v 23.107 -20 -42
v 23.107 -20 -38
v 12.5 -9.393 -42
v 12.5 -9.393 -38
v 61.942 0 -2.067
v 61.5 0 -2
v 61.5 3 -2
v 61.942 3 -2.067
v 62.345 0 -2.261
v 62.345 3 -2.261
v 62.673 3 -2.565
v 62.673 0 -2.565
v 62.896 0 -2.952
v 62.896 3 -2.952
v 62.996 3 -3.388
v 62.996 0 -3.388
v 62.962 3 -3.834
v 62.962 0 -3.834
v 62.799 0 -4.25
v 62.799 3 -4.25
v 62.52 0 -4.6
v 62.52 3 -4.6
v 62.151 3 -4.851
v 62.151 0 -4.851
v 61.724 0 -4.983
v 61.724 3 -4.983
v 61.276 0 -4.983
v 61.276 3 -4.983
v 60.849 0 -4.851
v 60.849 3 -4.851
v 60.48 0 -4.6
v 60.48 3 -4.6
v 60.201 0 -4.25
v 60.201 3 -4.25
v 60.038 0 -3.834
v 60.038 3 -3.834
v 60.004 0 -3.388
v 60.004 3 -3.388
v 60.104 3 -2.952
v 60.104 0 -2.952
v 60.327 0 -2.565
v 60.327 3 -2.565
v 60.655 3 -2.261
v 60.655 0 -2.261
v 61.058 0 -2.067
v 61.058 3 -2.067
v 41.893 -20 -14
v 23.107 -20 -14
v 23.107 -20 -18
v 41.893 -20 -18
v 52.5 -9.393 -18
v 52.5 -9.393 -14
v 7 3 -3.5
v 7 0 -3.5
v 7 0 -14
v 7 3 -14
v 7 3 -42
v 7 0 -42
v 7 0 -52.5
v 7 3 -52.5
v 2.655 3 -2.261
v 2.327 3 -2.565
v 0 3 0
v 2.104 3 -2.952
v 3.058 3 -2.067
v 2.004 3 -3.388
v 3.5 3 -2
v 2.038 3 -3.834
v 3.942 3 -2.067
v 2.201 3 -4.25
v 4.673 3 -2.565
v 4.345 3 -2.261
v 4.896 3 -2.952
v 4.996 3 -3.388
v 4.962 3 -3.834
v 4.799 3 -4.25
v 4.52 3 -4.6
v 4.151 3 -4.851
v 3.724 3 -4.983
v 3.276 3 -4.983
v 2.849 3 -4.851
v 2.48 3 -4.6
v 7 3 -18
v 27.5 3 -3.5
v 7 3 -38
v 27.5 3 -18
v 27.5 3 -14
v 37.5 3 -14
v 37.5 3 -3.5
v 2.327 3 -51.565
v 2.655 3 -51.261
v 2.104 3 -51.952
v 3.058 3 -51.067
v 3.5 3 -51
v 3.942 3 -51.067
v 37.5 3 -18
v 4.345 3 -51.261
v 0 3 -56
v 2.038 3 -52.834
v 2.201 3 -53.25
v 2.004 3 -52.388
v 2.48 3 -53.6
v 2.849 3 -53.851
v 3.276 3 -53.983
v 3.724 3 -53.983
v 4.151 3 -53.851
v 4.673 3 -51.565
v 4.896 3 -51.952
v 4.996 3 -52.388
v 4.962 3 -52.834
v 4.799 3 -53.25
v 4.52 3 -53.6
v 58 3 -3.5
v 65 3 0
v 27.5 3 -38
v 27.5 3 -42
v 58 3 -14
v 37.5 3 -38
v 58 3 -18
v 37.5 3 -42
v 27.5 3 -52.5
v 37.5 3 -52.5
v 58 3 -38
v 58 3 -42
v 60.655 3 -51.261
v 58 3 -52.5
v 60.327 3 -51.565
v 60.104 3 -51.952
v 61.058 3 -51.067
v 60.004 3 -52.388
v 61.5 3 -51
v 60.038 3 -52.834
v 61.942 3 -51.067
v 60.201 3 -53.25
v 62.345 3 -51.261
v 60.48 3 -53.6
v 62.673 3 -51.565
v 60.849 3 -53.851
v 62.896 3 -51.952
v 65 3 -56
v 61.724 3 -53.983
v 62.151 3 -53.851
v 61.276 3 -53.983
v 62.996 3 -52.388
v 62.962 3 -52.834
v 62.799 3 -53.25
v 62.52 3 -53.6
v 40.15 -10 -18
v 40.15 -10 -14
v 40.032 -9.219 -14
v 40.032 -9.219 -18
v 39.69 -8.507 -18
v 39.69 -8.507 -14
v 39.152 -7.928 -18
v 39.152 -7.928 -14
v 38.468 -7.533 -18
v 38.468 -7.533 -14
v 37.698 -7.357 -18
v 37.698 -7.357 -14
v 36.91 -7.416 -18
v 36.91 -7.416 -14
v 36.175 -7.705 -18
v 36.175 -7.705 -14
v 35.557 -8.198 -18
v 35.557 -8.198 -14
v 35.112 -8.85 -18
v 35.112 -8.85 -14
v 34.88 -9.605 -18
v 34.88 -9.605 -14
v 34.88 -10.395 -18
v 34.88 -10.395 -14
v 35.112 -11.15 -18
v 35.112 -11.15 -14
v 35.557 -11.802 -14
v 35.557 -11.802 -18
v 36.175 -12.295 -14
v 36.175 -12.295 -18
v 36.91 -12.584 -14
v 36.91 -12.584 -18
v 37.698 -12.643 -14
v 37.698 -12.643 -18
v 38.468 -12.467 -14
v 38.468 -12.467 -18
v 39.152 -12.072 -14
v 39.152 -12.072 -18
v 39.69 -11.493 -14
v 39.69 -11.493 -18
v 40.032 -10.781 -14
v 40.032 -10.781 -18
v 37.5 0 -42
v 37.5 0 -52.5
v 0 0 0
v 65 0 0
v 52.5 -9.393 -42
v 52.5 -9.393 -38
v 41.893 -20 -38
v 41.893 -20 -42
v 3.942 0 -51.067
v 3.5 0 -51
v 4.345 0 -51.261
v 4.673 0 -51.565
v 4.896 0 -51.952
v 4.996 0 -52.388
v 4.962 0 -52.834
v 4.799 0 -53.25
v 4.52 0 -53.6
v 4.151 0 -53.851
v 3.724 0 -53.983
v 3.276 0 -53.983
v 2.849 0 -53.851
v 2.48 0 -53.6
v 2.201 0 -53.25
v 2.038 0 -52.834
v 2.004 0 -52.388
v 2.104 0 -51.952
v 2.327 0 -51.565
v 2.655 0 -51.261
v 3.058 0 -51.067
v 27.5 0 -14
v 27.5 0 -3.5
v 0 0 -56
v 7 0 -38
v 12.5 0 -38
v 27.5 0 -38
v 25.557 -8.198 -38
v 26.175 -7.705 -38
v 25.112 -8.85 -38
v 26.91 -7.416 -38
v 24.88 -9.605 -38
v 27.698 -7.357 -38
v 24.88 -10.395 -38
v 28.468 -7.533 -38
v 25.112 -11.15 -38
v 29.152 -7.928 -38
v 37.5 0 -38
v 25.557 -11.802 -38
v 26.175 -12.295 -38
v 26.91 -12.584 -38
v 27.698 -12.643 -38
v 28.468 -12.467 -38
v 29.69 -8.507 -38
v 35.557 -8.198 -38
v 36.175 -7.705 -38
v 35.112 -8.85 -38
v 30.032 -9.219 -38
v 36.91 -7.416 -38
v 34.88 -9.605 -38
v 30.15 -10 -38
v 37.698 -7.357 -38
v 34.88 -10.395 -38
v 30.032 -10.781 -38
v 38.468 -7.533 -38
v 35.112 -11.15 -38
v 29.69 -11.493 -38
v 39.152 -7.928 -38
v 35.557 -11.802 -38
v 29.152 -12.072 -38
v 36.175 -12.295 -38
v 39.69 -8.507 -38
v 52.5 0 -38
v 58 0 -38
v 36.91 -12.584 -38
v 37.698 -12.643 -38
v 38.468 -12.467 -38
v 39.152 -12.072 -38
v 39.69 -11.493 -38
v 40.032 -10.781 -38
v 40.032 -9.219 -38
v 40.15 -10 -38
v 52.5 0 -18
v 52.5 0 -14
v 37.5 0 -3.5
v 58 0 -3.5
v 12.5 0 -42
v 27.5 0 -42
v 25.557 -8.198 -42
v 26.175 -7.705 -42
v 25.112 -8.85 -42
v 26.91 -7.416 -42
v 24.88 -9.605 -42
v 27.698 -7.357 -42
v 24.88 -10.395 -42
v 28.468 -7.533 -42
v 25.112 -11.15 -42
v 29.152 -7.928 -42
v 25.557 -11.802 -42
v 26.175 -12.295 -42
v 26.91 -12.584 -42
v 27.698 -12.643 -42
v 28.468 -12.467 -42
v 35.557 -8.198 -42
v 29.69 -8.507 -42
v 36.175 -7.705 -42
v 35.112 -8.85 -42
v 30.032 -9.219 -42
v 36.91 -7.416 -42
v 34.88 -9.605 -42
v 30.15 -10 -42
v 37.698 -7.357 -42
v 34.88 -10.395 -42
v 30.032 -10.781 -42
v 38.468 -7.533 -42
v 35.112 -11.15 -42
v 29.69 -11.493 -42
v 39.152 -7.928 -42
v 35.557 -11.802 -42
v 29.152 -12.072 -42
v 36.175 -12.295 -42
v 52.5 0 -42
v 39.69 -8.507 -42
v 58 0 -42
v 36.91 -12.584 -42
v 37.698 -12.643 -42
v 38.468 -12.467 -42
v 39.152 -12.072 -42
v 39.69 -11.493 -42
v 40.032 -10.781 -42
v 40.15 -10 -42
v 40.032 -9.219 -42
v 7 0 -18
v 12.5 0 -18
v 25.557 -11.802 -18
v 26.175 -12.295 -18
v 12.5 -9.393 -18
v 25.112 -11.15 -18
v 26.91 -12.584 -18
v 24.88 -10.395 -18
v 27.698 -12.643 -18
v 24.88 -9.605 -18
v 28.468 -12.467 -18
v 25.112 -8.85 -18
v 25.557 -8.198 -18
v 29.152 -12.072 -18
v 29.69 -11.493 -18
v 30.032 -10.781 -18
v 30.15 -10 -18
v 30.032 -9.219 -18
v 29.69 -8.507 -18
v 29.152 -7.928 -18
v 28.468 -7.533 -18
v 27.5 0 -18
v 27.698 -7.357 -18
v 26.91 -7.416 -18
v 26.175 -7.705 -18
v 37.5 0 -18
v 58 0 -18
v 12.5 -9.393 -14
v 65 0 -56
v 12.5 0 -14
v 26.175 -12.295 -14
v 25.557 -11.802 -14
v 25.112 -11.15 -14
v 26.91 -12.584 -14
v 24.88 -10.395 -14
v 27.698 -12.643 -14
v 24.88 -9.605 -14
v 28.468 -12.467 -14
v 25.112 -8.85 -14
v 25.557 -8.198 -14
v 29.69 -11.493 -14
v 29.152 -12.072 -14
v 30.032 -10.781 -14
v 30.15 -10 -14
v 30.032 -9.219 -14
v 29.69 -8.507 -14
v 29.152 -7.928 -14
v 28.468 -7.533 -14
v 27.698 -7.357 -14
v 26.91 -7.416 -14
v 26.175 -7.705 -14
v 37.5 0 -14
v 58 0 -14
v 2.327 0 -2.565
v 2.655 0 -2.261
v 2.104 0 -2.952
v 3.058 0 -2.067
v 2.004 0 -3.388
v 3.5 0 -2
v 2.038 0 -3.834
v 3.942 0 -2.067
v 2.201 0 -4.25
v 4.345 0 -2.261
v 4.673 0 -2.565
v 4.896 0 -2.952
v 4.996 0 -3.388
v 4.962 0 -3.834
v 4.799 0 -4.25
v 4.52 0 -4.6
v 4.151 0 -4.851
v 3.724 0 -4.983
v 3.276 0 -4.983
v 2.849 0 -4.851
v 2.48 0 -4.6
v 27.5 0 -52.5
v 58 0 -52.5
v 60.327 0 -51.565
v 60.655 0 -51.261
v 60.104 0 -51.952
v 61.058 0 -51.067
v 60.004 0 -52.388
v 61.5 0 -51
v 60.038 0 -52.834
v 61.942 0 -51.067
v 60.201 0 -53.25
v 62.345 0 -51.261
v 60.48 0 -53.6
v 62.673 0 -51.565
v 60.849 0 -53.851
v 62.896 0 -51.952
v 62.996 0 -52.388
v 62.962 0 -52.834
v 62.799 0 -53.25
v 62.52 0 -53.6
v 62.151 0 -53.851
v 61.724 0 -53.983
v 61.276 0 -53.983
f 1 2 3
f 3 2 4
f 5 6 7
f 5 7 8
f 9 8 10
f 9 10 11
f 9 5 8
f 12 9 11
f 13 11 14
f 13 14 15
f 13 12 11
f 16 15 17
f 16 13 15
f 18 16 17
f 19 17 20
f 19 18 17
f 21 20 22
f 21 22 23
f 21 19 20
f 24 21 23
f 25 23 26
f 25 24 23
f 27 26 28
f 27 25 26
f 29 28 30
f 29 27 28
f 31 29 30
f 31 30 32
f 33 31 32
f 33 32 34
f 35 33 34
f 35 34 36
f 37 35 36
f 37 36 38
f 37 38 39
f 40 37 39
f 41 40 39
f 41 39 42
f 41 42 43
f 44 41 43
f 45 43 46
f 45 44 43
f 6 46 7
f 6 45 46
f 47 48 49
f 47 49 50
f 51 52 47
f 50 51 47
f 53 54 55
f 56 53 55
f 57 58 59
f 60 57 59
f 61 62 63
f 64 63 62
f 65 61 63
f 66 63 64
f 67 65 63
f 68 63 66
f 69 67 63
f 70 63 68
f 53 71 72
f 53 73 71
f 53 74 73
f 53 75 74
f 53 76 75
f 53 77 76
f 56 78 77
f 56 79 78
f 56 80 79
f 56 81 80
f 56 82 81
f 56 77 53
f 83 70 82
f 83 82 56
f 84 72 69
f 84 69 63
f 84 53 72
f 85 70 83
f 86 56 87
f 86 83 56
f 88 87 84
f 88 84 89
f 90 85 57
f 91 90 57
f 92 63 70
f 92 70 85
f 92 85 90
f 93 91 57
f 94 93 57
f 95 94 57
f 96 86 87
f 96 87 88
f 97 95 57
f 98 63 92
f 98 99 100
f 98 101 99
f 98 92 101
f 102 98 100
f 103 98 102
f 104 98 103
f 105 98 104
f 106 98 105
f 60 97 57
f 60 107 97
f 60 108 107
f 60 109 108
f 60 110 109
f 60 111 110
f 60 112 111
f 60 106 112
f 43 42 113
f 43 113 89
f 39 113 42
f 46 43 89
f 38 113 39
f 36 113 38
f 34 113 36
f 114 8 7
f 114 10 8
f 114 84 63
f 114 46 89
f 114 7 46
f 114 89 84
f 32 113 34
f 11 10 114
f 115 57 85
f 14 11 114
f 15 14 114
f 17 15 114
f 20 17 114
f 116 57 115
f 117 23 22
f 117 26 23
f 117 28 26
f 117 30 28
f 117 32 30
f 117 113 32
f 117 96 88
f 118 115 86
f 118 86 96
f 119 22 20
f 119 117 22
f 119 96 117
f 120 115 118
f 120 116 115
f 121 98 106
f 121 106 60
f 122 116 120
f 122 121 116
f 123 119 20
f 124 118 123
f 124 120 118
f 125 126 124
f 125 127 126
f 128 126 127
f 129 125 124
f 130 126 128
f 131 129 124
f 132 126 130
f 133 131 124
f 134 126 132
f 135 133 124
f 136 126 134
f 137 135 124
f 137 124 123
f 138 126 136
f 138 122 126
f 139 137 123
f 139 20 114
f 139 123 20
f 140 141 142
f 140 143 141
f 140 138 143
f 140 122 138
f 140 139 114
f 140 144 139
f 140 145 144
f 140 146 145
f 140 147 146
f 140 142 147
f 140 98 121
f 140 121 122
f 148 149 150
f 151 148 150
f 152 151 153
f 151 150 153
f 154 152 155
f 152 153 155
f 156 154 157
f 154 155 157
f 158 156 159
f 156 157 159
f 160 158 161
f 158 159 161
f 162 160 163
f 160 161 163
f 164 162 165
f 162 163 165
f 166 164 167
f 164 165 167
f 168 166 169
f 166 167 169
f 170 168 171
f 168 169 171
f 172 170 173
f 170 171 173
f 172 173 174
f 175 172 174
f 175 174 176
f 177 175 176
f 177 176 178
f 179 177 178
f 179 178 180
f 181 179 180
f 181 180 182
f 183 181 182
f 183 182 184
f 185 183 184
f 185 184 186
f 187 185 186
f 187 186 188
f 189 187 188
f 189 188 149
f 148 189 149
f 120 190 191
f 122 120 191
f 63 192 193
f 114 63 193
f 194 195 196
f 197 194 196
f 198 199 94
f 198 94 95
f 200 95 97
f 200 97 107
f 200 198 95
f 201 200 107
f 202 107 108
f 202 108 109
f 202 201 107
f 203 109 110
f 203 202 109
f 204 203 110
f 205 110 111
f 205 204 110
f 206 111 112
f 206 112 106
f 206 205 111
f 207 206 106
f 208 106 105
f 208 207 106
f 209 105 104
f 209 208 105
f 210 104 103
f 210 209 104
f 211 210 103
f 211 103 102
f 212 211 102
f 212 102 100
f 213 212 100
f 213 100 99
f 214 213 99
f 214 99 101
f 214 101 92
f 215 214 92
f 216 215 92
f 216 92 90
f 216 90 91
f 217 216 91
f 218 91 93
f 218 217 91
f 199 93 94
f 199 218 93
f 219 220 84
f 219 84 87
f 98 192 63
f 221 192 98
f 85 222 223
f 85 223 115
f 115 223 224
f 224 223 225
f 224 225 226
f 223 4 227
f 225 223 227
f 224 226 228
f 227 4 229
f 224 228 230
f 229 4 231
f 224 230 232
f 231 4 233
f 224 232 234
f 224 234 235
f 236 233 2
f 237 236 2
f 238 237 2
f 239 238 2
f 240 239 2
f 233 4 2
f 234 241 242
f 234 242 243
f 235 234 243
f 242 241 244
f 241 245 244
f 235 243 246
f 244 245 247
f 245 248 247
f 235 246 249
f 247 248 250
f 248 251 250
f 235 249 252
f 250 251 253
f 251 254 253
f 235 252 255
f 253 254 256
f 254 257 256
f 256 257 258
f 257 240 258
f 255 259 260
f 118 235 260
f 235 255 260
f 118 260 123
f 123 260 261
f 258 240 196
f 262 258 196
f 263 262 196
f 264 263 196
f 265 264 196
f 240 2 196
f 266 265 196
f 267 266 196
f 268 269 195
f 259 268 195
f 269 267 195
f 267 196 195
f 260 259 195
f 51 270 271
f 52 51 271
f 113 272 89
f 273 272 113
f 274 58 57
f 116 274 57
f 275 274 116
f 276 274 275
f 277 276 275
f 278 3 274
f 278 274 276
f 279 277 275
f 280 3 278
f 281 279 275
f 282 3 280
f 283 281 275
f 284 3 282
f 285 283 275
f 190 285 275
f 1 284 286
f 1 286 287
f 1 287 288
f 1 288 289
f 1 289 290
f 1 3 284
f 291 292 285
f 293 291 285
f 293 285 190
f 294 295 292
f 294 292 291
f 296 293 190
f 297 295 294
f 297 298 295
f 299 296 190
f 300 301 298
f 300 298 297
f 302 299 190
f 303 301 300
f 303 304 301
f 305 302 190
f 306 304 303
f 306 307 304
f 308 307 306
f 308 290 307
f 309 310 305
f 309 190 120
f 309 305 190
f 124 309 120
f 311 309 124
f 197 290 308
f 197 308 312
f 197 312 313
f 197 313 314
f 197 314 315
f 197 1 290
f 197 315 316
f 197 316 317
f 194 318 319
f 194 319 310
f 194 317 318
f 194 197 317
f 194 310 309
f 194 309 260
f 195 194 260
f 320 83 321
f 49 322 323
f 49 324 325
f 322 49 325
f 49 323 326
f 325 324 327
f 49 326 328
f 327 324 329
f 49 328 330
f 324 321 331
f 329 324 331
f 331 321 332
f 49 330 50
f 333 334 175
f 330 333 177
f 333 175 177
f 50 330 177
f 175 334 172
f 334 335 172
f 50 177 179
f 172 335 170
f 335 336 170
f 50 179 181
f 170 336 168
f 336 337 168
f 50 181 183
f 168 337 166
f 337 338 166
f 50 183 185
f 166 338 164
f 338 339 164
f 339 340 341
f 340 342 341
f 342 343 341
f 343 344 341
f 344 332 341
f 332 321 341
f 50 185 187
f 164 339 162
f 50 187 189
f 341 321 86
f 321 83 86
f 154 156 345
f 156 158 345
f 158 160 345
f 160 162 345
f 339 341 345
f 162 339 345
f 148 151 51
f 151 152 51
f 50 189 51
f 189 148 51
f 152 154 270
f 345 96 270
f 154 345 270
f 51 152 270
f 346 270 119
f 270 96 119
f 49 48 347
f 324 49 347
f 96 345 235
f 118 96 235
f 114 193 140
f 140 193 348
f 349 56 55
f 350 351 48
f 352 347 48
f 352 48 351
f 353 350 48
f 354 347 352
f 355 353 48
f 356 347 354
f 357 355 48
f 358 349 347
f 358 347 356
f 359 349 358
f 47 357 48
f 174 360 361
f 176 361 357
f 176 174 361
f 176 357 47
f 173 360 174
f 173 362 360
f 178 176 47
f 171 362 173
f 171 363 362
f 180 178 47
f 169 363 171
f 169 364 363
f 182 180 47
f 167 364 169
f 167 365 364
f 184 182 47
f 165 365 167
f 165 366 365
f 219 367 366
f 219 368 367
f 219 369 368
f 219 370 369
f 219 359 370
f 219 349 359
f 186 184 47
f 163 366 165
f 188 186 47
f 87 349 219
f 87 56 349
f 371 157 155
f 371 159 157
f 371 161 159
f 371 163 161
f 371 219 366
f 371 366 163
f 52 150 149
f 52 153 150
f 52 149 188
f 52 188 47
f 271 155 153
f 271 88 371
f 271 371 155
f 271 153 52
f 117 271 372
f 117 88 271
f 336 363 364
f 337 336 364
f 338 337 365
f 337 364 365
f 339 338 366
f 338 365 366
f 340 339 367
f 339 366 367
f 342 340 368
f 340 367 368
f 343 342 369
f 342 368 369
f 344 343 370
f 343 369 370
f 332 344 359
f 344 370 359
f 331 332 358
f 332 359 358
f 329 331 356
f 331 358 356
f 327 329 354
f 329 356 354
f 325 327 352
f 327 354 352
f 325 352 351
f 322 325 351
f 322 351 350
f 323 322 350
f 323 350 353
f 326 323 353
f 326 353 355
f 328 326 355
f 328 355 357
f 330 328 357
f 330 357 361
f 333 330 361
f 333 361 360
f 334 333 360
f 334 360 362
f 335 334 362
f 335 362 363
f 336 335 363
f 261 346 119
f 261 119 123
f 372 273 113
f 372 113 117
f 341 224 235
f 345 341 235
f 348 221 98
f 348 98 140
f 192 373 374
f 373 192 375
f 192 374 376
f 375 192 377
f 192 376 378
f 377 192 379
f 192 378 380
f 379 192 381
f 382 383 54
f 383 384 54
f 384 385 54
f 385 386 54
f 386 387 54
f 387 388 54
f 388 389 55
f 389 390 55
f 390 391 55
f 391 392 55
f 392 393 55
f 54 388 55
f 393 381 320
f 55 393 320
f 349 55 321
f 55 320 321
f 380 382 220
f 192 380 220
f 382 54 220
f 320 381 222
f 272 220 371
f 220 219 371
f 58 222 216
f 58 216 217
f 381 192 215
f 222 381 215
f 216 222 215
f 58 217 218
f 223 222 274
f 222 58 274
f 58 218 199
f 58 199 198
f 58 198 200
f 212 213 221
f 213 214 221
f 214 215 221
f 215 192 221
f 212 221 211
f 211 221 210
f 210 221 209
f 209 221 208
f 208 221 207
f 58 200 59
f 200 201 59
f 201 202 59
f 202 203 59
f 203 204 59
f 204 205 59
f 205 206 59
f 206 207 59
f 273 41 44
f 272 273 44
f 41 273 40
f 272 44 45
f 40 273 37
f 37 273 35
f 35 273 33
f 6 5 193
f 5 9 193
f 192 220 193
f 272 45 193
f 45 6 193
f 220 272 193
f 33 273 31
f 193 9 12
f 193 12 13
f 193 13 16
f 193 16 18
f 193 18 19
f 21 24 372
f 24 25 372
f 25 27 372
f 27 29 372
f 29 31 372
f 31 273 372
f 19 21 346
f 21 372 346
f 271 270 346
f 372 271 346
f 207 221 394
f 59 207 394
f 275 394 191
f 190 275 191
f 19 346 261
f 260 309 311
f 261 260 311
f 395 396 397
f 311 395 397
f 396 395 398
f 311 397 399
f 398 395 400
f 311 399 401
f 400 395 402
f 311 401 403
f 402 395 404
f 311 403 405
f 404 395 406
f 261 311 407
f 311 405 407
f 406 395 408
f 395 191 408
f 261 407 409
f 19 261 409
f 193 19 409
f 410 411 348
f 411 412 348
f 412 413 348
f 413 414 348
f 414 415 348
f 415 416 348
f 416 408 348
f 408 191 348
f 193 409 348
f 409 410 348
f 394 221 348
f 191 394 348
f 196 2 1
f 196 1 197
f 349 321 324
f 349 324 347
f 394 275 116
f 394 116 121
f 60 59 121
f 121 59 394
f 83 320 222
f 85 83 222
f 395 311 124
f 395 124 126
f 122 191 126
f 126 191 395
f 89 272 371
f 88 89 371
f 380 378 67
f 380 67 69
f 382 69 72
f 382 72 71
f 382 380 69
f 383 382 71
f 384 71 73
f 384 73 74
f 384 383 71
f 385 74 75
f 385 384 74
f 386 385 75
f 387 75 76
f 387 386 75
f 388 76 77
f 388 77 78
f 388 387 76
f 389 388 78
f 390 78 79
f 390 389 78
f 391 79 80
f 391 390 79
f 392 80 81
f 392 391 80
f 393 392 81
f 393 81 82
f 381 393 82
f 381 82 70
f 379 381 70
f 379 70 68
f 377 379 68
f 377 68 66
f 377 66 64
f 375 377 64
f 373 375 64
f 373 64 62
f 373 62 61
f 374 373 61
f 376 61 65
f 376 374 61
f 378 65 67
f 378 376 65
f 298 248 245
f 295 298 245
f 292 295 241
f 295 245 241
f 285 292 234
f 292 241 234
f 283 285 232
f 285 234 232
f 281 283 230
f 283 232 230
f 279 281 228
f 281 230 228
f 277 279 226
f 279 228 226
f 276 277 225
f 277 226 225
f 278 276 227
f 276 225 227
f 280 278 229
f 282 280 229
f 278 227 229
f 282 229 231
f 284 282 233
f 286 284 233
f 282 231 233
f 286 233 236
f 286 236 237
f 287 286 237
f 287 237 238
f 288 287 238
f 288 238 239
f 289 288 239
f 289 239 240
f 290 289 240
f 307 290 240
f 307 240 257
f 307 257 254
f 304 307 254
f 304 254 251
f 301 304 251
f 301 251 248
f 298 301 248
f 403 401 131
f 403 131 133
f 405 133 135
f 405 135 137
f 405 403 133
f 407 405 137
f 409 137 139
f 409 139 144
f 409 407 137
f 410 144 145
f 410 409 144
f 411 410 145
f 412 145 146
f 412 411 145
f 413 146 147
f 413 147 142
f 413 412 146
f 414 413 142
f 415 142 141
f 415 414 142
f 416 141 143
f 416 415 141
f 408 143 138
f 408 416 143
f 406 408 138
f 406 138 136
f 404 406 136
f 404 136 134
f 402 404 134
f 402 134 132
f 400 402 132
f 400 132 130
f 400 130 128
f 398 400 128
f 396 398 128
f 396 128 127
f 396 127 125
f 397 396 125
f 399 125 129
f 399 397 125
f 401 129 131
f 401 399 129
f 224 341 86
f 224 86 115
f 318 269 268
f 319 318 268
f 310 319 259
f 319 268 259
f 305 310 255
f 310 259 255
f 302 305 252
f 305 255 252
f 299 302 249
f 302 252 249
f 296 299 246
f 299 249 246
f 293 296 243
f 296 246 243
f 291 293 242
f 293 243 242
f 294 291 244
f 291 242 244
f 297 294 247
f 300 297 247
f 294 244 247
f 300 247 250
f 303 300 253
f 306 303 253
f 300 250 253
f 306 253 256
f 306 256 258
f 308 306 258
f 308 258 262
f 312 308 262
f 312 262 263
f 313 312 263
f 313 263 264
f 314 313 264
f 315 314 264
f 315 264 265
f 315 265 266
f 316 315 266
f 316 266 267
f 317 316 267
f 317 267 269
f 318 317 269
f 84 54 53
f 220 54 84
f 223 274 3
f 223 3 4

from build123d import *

# Parameters (mm, degrees)
SKETCH1_W           = 65
SKETCH1_H           = 56
SKETCH1_R           = 1.5
SKETCH1_W_2         = 20.5
SKETCH1_H_2         = 20
SKETCH1_H_3         = 10.5
BOSS_EXTRUDE1_DEPTH = 3
SKETCH5_W           = 40
SKETCH5_H           = 4
BOSS_EXTRUDE4_DEPTH = 20
CUT_EXTRUDE1_REACH  = 81.931
SKETCH6_R           = 2.65


with BuildPart() as part:
    # Sketch1 → Boss-Extrude1 (new body)
    with BuildSketch(Plane(origin=(0, 0, 0), x_dir=(1, 0, 0), z_dir=(0, 1, 0))):
        with Locations((32.5, 28)):
            Rectangle(SKETCH1_W, SKETCH1_H)
        with Locations(Location((3.5, 52.5, 0), (0, 0, 270))):
            Circle(SKETCH1_R, mode=Mode.SUBTRACT)
        with Locations(Location((61.5, 52.5, 0), (0, 0, 270))):
            Circle(SKETCH1_R, mode=Mode.SUBTRACT)
        with Locations(Location((61.5, 3.5, 0), (0, 0, 270))):
            Circle(SKETCH1_R, mode=Mode.SUBTRACT)
        with Locations(Location((3.5, 3.5, 0), (0, 0, 270))):
            Circle(SKETCH1_R, mode=Mode.SUBTRACT)
        with Locations((17.25, 28)):
            Rectangle(SKETCH1_W_2, SKETCH1_H_2, mode=Mode.SUBTRACT)
        with Locations((47.75, 28)):
            Rectangle(SKETCH1_W_2, SKETCH1_H_2, mode=Mode.SUBTRACT)
        with Locations((17.25, 47.25)):
            Rectangle(SKETCH1_W_2, SKETCH1_H_3, mode=Mode.SUBTRACT)
        with Locations((47.75, 47.25)):
            Rectangle(SKETCH1_W_2, SKETCH1_H_3, mode=Mode.SUBTRACT)
        with Locations((47.75, 8.75)):
            Rectangle(SKETCH1_W_2, SKETCH1_H_3, mode=Mode.SUBTRACT)
        with Locations((17.25, 8.75)):
            Rectangle(SKETCH1_W_2, SKETCH1_H_3, mode=Mode.SUBTRACT)
    extrude(amount=BOSS_EXTRUDE1_DEPTH)

    # Sketch5 → Boss-Extrude4 (add)
    with BuildSketch(Plane.XZ):
        with Locations((32.5, -16)):
            Rectangle(SKETCH5_W, SKETCH5_H)
        with Locations((32.5, -40)):
            Rectangle(SKETCH5_W, SKETCH5_H)
    extrude(amount=BOSS_EXTRUDE4_DEPTH)

    # Cut-Extrude1: up to this face of the body (flat: up to its plane)
    cut_extrude1_end = Plane(part.part.faces().sort_by_distance((32.5, -8.467497291, -42))[0])
    # Sketch6 → Cut-Extrude1 (cut, up to the picked face)
    with BuildSketch(Plane.XY.offset(-14), mode=Mode.PRIVATE) as cut_extrude1_sk1:
        with Locations((27.5, -10)):
            Circle(SKETCH6_R)
    cut_extrude1_tool1 = split(extrude(cut_extrude1_sk1.sketch, amount=-CUT_EXTRUDE1_REACH, mode=Mode.PRIVATE), bisect_by=cut_extrude1_end, keep=Keep.BOTH, mode=Mode.PRIVATE)
    # Sketch6 → Cut-Extrude1 (cut, up to the picked face)
    with BuildSketch(Plane.XY.offset(-14), mode=Mode.PRIVATE) as cut_extrude1_sk2:
        with Locations((37.5, -10)):
            Circle(SKETCH6_R)
    cut_extrude1_tool2 = split(extrude(cut_extrude1_sk2.sketch, amount=-CUT_EXTRUDE1_REACH, mode=Mode.PRIVATE), bisect_by=cut_extrude1_end, keep=Keep.BOTH, mode=Mode.PRIVATE)
    # Sketch6 → Cut-Extrude1 (cut, up to the picked face)
    with BuildSketch(Plane.XY.offset(-14), mode=Mode.PRIVATE) as cut_extrude1_sk3:
        Polygon((12.5, -9.393398282), (12.5, -20), (23.106601718, -20), align=None)
    cut_extrude1_tool3 = split(extrude(cut_extrude1_sk3.sketch, amount=-CUT_EXTRUDE1_REACH, mode=Mode.PRIVATE), bisect_by=cut_extrude1_end, keep=Keep.BOTH, mode=Mode.PRIVATE)
    # Sketch6 → Cut-Extrude1 (cut, up to the picked face)
    with BuildSketch(Plane.XY.offset(-14), mode=Mode.PRIVATE) as cut_extrude1_sk4:
        Polygon((41.893398282, -20), (52.5, -20), (52.5, -9.393398282), align=None)
    cut_extrude1_tool4 = split(extrude(cut_extrude1_sk4.sketch, amount=-CUT_EXTRUDE1_REACH, mode=Mode.PRIVATE), bisect_by=cut_extrude1_end, keep=Keep.BOTH, mode=Mode.PRIVATE)
    add(cut_extrude1_tool1.solids().sort_by(Axis((27.5, -10, -14), (0, 0, -1)))[0], mode=Mode.SUBTRACT)
    add(cut_extrude1_tool2.solids().sort_by(Axis((37.5, -10, -14), (0, 0, -1)))[0], mode=Mode.SUBTRACT)
    add(cut_extrude1_tool3.solids().sort_by(Axis((16.035534, -16.464466, -14), (0, 0, -1)))[0], mode=Mode.SUBTRACT)
    add(cut_extrude1_tool4.solids().sort_by(Axis((48.964466, -16.464466, -14), (0, 0, -1)))[0], mode=Mode.SUBTRACT)


solid = part.part
